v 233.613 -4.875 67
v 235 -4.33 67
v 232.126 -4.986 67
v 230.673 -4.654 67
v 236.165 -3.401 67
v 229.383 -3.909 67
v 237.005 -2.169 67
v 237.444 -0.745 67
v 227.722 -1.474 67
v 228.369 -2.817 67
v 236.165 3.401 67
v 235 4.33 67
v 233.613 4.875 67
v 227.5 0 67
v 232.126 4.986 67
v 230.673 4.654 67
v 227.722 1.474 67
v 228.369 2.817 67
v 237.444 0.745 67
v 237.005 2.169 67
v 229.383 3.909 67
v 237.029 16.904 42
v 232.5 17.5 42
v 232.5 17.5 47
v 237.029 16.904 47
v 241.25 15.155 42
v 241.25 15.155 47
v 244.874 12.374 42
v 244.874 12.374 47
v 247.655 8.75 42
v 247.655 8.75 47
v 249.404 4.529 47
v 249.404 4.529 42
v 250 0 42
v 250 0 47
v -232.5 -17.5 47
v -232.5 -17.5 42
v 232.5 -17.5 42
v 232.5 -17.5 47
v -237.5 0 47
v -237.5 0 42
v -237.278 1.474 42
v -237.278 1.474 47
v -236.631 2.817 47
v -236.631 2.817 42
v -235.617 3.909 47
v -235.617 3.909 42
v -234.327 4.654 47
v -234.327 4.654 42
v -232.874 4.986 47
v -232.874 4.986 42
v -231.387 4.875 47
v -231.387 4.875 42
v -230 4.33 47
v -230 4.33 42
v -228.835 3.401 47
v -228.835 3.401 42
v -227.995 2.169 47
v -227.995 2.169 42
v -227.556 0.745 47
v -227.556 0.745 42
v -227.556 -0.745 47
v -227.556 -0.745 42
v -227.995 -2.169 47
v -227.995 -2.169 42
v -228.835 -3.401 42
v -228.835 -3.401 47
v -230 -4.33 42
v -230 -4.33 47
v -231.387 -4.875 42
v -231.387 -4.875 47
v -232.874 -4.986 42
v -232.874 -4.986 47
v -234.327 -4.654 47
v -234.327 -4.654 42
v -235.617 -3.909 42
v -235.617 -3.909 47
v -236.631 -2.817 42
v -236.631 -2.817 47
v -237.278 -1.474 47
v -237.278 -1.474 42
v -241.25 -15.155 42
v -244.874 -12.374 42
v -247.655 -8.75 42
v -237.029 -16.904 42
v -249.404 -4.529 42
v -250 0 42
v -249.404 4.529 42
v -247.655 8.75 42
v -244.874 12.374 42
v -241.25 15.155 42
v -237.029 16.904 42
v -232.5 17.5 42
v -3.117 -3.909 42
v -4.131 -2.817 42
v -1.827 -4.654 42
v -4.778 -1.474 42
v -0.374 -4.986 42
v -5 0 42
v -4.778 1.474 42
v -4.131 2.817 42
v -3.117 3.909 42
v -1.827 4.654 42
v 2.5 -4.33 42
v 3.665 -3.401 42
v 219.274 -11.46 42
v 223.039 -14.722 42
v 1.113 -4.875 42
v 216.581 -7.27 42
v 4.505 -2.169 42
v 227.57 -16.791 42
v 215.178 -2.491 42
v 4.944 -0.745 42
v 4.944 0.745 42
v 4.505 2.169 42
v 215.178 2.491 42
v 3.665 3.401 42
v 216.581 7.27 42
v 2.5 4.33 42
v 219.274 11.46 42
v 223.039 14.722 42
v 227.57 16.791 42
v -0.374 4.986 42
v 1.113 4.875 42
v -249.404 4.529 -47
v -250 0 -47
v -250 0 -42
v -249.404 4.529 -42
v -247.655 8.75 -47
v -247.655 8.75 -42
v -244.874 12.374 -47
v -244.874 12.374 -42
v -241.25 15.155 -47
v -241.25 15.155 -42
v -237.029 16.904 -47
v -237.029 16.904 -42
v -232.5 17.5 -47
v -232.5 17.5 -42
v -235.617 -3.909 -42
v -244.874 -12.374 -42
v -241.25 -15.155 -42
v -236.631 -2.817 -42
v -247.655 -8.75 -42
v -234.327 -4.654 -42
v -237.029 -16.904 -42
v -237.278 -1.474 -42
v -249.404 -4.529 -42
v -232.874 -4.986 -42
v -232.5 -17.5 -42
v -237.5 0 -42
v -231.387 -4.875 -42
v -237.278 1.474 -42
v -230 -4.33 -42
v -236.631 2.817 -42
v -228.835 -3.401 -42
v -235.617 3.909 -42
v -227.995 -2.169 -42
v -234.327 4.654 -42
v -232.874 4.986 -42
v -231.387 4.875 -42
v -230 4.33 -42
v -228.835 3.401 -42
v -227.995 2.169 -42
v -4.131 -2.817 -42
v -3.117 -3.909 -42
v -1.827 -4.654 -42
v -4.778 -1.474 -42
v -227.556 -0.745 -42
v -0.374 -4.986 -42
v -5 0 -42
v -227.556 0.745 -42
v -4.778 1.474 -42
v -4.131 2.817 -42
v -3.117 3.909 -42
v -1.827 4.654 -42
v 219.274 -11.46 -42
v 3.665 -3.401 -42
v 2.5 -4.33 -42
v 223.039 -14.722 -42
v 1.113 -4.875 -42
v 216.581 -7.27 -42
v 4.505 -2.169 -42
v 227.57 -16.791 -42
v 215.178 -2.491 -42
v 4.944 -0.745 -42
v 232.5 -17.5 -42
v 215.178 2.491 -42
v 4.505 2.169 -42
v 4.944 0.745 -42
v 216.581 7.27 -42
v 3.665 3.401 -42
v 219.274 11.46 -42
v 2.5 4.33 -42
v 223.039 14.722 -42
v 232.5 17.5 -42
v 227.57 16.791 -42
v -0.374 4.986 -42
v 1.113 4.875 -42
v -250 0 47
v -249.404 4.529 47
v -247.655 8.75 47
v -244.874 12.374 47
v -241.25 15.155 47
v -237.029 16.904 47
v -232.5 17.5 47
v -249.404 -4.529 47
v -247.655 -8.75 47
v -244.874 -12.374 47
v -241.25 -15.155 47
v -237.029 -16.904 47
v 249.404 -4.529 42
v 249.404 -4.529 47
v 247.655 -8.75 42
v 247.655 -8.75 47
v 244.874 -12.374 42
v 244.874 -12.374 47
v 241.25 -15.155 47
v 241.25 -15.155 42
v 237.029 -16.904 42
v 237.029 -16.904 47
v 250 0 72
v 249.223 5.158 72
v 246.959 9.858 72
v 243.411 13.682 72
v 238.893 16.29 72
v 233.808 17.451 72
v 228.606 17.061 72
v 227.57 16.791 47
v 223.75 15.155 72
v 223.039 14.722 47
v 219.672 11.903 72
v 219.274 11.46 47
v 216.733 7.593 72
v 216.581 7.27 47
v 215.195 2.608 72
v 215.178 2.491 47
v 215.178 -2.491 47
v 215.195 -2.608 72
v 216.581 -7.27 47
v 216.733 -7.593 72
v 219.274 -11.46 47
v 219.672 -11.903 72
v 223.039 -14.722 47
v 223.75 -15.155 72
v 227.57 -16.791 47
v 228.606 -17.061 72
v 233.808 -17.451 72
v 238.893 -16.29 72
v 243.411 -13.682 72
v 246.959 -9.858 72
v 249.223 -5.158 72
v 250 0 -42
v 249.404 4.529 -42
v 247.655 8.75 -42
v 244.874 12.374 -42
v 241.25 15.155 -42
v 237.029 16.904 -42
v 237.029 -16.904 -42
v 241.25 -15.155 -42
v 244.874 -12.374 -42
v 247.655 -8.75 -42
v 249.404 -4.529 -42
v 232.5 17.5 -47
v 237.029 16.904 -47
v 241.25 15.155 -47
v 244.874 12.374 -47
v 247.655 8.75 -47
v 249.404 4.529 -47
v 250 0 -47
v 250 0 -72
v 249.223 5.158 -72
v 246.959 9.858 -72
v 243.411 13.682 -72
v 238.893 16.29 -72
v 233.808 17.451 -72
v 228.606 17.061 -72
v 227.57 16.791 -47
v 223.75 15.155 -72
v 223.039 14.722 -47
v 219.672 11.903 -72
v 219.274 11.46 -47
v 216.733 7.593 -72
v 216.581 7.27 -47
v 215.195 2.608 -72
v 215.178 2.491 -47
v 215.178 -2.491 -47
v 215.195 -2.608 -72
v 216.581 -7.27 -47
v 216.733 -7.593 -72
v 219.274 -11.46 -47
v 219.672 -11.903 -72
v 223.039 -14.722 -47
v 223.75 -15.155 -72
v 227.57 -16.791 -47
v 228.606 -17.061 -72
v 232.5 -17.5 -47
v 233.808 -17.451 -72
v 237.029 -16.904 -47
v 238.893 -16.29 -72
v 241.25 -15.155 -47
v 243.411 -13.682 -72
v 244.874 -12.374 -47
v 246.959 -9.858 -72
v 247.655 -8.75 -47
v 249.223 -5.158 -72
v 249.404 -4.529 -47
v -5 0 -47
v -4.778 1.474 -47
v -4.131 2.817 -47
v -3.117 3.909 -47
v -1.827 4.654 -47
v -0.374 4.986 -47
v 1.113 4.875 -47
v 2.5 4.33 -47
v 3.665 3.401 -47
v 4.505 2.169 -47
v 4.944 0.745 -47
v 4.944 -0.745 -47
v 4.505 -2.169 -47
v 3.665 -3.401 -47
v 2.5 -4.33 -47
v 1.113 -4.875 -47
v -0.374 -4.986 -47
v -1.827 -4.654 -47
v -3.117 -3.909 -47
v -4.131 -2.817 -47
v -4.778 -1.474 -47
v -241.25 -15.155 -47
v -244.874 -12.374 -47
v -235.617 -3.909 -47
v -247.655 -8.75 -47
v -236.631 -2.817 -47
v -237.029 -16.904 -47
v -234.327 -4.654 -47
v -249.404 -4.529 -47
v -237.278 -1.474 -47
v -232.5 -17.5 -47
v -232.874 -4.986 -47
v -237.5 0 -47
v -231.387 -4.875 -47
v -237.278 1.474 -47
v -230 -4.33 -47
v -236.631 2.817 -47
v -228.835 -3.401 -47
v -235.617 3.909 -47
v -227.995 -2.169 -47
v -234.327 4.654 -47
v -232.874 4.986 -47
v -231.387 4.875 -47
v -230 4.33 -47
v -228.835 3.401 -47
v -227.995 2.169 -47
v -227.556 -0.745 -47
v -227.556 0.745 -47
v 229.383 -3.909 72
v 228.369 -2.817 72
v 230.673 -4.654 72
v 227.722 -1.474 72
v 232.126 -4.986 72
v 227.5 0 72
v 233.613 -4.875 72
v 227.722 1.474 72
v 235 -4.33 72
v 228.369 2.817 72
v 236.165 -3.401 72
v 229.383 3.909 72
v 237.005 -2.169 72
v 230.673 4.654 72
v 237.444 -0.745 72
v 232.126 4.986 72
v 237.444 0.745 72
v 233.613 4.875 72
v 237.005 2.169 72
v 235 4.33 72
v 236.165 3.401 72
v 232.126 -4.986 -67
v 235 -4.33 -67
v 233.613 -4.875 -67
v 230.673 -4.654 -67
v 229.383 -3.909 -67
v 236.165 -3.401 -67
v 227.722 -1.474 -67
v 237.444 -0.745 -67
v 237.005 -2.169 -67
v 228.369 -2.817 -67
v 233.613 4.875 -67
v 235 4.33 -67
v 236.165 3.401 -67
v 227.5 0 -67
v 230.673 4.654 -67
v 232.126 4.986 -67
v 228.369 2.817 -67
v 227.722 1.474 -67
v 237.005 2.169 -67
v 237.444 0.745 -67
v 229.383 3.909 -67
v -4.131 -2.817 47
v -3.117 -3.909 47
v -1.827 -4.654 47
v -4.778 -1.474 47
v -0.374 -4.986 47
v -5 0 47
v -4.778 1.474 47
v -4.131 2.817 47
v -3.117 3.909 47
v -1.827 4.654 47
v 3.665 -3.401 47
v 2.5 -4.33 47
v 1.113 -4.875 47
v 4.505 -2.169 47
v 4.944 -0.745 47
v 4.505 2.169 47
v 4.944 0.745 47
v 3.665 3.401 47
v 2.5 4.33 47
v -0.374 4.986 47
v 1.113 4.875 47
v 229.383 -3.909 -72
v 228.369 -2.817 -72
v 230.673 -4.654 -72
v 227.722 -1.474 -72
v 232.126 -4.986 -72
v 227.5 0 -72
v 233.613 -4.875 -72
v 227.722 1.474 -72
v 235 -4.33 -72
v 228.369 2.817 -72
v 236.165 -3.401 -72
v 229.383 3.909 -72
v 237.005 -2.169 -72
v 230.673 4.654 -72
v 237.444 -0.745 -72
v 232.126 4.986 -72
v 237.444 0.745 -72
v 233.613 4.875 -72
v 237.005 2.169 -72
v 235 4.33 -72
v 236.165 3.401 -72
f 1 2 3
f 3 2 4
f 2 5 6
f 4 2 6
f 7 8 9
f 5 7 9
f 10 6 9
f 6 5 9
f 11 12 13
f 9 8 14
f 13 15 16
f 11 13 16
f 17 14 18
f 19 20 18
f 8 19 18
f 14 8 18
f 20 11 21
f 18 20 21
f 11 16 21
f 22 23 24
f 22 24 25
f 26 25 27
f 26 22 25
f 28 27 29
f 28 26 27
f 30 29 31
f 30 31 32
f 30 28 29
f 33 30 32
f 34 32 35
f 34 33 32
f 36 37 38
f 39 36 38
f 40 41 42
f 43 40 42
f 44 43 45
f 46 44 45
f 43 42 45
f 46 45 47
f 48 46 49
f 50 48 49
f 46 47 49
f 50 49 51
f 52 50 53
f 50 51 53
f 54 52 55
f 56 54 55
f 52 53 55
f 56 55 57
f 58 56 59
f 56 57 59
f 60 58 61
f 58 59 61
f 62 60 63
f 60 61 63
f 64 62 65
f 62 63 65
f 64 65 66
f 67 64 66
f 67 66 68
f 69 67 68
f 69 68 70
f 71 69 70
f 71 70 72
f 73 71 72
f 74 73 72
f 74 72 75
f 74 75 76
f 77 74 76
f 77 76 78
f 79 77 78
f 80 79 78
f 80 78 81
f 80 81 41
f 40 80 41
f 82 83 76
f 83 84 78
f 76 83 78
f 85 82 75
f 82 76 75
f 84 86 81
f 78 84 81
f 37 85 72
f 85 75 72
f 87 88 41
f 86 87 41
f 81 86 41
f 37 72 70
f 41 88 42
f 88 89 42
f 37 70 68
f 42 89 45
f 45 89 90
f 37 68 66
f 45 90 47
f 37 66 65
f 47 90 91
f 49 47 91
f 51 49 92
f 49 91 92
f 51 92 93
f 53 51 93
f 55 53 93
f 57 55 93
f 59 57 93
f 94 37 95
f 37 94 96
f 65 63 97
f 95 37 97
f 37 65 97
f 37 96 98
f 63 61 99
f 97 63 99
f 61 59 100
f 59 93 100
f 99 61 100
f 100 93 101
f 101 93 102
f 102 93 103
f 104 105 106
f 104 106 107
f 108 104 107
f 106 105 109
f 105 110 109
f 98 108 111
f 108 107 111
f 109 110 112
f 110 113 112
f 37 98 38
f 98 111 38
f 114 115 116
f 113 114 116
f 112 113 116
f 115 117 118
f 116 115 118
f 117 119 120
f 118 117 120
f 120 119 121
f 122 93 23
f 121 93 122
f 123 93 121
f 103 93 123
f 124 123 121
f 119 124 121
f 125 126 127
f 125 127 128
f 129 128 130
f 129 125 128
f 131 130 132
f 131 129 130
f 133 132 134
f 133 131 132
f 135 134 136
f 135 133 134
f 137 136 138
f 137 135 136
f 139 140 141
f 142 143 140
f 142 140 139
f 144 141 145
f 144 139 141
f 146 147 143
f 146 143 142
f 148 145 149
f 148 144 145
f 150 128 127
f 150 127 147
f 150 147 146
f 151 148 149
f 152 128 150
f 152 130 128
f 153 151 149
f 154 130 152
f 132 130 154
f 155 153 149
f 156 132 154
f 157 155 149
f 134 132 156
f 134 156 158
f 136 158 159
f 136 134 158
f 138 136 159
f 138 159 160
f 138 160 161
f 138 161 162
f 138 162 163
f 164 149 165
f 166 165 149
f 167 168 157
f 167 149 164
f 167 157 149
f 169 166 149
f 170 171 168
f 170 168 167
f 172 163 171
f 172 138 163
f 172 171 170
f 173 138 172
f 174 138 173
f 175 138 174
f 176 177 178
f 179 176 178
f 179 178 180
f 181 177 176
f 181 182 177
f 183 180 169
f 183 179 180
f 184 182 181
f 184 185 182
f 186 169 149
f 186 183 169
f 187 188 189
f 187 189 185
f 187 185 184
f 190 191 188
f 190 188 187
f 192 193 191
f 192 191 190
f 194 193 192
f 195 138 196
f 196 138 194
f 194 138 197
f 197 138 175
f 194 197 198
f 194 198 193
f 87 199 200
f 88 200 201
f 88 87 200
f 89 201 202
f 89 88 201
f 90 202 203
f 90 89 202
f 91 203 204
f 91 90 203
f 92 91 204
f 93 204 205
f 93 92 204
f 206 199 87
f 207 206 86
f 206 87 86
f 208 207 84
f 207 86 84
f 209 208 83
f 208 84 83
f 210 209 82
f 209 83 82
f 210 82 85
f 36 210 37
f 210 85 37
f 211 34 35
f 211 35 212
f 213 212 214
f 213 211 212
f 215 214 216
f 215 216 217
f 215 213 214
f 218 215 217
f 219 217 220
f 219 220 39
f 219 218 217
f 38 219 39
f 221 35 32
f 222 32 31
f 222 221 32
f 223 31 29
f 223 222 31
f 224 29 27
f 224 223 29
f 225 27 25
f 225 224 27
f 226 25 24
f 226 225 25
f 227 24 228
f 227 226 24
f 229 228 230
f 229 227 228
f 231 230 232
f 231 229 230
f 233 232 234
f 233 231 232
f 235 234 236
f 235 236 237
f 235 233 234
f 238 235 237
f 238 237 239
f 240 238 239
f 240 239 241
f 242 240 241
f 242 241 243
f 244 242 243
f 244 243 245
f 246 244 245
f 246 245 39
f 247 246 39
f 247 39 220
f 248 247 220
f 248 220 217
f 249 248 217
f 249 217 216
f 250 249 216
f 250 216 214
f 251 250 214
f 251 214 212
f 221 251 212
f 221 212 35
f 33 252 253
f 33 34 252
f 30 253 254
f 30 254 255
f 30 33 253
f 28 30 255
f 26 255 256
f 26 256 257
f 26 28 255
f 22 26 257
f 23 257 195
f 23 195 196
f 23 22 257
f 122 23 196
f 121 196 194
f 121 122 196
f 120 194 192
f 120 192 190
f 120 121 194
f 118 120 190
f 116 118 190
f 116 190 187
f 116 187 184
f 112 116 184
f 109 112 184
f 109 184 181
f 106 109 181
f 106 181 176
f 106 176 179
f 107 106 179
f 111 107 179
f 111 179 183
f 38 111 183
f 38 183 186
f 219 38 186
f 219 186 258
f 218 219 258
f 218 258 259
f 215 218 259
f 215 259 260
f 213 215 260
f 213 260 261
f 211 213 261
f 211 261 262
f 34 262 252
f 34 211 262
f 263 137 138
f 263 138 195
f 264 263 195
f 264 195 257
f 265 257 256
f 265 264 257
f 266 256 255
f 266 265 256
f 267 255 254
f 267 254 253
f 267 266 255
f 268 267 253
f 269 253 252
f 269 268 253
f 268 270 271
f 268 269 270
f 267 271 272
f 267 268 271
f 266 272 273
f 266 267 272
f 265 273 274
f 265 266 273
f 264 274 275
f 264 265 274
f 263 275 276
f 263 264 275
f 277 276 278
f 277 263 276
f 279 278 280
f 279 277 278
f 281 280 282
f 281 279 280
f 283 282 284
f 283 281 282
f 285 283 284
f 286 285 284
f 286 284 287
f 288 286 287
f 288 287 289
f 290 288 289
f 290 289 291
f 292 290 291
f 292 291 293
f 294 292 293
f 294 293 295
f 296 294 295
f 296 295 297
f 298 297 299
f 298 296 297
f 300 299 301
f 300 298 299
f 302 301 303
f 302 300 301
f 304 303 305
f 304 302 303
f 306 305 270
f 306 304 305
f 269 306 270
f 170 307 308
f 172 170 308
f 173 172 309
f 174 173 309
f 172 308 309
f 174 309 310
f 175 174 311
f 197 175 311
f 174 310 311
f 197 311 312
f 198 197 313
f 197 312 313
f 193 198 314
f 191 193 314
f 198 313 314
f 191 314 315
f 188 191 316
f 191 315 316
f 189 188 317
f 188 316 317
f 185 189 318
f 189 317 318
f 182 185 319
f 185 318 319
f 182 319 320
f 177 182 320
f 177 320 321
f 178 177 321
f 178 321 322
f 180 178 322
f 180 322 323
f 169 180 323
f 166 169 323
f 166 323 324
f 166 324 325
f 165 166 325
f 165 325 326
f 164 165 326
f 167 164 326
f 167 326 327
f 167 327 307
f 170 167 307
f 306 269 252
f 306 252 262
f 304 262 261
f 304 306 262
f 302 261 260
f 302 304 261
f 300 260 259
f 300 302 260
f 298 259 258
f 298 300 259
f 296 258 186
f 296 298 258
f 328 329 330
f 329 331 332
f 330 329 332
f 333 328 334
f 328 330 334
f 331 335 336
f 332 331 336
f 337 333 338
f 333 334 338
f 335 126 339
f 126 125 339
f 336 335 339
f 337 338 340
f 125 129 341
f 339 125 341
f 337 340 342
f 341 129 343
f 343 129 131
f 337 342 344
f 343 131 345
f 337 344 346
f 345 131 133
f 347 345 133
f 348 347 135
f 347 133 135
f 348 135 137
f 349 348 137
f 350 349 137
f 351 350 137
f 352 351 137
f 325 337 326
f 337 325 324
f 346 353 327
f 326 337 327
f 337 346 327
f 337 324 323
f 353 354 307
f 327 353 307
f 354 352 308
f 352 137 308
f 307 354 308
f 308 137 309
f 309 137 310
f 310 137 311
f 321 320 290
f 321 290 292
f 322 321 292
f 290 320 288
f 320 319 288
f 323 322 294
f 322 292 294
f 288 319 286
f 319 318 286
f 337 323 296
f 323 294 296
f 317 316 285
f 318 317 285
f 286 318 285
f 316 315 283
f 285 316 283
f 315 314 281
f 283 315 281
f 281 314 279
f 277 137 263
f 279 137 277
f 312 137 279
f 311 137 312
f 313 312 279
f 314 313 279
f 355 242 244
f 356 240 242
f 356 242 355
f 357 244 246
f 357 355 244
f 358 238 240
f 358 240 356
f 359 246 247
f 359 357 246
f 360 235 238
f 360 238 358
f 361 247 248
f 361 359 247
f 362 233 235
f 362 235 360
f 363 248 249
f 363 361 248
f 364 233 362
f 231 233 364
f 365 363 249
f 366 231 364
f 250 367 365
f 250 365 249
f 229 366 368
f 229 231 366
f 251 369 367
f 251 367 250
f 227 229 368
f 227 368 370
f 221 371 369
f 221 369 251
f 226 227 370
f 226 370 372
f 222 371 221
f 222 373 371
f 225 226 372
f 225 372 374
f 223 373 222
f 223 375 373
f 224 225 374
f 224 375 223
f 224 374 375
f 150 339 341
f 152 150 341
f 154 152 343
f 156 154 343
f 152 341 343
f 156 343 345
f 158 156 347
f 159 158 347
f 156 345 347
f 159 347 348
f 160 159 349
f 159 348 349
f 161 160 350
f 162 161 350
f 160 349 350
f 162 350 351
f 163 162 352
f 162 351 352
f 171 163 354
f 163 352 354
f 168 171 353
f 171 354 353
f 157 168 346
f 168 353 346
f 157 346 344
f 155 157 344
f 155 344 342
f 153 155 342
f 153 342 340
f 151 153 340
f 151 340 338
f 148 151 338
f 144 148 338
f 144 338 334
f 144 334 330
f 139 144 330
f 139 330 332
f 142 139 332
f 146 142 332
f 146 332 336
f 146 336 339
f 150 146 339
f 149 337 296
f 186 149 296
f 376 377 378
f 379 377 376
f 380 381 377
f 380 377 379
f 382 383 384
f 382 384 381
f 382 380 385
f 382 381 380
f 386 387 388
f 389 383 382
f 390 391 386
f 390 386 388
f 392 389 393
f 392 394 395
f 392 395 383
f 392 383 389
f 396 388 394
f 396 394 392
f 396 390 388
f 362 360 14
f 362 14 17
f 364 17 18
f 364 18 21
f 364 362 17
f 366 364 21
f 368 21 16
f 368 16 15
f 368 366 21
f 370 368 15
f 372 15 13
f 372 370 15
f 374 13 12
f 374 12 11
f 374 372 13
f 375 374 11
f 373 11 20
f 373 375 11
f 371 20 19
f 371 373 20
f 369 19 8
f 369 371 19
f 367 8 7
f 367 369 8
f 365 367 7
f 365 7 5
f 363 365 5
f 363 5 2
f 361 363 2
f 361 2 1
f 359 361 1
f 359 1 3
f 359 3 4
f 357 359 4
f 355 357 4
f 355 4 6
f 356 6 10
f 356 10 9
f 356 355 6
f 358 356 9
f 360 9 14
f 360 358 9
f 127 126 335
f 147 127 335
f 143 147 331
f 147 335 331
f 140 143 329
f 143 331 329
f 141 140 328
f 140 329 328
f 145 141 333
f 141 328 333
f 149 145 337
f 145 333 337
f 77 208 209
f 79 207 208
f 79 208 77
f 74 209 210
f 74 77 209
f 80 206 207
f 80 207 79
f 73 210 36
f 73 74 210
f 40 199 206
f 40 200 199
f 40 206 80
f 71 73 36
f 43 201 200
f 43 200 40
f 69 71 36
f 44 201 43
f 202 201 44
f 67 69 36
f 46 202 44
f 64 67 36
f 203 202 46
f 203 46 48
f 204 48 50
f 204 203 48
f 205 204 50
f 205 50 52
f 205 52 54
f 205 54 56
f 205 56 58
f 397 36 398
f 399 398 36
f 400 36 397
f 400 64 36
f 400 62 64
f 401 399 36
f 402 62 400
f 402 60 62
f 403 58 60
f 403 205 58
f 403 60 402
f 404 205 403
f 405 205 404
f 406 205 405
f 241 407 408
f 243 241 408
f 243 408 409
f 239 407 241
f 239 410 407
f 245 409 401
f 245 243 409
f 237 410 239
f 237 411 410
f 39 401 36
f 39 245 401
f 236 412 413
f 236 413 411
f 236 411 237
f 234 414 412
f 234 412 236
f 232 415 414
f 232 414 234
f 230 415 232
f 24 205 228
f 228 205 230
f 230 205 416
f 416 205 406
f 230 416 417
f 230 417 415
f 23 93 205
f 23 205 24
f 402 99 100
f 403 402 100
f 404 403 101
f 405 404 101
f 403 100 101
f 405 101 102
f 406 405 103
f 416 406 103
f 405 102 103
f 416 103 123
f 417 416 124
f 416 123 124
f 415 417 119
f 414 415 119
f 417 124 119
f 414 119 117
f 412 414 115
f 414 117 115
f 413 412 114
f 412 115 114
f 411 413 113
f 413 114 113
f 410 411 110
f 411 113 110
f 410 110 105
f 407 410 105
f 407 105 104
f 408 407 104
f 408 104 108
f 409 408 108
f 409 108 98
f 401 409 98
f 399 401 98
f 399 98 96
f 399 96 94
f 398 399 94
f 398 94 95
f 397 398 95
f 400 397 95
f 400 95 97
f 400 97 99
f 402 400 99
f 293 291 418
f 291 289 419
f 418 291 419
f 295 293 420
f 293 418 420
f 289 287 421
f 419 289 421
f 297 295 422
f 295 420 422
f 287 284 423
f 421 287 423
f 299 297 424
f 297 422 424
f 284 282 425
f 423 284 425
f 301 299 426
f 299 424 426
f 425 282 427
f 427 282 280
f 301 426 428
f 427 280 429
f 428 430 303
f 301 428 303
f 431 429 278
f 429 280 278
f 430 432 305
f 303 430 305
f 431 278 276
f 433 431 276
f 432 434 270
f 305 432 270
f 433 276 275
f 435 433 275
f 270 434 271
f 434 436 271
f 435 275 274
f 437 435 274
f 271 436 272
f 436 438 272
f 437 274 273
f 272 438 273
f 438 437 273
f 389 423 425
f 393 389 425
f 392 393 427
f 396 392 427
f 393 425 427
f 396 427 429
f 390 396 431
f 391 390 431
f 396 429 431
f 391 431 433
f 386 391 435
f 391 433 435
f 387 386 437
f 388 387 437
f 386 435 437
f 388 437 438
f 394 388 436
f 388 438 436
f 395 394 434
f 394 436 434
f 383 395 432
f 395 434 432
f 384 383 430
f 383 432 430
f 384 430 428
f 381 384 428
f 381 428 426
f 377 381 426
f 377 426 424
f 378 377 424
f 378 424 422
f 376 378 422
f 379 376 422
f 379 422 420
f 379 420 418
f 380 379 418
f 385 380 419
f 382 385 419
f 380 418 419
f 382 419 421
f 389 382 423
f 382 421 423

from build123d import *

# Parameters (mm, degrees)
SKETCH3_W           = 500
SKETCH3_H           = 94
BOSS_EXTRUDE3_DEPTH = 17.5
FILLET2_R           = 17.5
SKETCH4_W           = 500
SKETCH4_H           = 84
CUT_EXTRUDE2_DEPTH  = 35
SKETCH9_R           = 5
CUT_EXTRUDE4_DEPTH  = 268.660699394
SKETCH5_R           = 17.5
BOSS_EXTRUDE4_DEPTH = 72
SKETCH8_R           = 5
CUT_EXTRUDE3_DEPTH  = 5


with BuildPart() as part:
    # Sketch3 → Boss-Extrude3 (new, symmetric)
    with BuildSketch(Plane(origin=(0, 0, 0), x_dir=(1, 0, 0), z_dir=(0, 1, 0))):
        Rectangle(SKETCH3_W, SKETCH3_H)
    extrude(amount=BOSS_EXTRUDE3_DEPTH, both=True)

    # Fillet2
    fillet2_edges = [part.edges().sort_by_distance(p)[0] for p in [
        (250, -17.5, 0),
        (250, 17.5, 0),
        (-250, -17.5, 0),
        (-250, 17.5, 0),
    ]]
    fillet(fillet2_edges, radius=FILLET2_R - 0.0001)  # a hair under: the kernel refuses the full size

    # Sketch4 → Cut-Extrude2 (cut)
    with BuildSketch(Plane(origin=(0, 17.5, 0), x_dir=(1, 0, 0), z_dir=(0, 1, 0))):
        Rectangle(SKETCH4_W, SKETCH4_H)
    extrude(amount=-CUT_EXTRUDE2_DEPTH, mode=Mode.SUBTRACT)


with BuildPart() as cut_extrude2_piece_1:
    # of the separate pieces the step leaves, piece 1, a body of its own (cut_extrude2_pieces)
    add(part.part.solids().sort_by_distance((-250, -0.0001, -47))[0])


with BuildPart() as cut_extrude2_piece_2:
    # of the separate pieces the step leaves, piece 2, a body of its own (cut_extrude2_pieces)
    add(part.part.solids().sort_by_distance((-250, -0.0001, 47))[0])


with BuildPart() as cut_extrude4_tool:
    # Sketch9 → Cut-Extrude4 (new, through all)
    with BuildSketch(Plane(origin=(0, 0, -47), x_dir=(-1, 0, 0), z_dir=(0, 0, -1))):
        Circle(SKETCH9_R)
        with Locations((232.5, 0)):
            Circle(SKETCH9_R)
    extrude(amount=-CUT_EXTRUDE4_DEPTH)


with BuildPart() as cut_extrude2_piece_1_1:
    add(cut_extrude2_piece_1.part)

    # Cut-Extrude4: cut by cut_extrude4_tool
    add(cut_extrude4_tool.part, mode=Mode.SUBTRACT)



with BuildPart() as cut_extrude2_piece_2_1:
    add(cut_extrude2_piece_2.part)

    # Cut-Extrude4: cut by cut_extrude4_tool
    add(cut_extrude4_tool.part, mode=Mode.SUBTRACT)


with BuildPart() as cut_extrude2_piece_1_2:
    add(cut_extrude2_piece_1_1.part)

    add(cut_extrude2_piece_2_1.part)  # Boss-Extrude4 merges Cut-Extrude2 piece 2
    # Sketch5 → Boss-Extrude4 (add, symmetric)
    with BuildSketch(Plane.XY):
        with Locations((232.5, 0)):
            Circle(SKETCH5_R)
    extrude(amount=BOSS_EXTRUDE4_DEPTH, both=True)

    # Sketch8 → Cut-Extrude3 (cut)
    with BuildSketch(Plane(origin=(0, 0, -72), x_dir=(-1, 0, 0), z_dir=(0, 0, -1))):
        with Locations((-232.5, 0)):
            Circle(SKETCH8_R)
    cut_extrude3 = extrude(amount=-CUT_EXTRUDE3_DEPTH, mode=Mode.SUBTRACT)

    # Mirror1: Cut-Extrude3 across plane
    add(cut_extrude3.mirror(Plane.XY), mode=Mode.SUBTRACT)


solid = cut_extrude2_piece_1_2.part
